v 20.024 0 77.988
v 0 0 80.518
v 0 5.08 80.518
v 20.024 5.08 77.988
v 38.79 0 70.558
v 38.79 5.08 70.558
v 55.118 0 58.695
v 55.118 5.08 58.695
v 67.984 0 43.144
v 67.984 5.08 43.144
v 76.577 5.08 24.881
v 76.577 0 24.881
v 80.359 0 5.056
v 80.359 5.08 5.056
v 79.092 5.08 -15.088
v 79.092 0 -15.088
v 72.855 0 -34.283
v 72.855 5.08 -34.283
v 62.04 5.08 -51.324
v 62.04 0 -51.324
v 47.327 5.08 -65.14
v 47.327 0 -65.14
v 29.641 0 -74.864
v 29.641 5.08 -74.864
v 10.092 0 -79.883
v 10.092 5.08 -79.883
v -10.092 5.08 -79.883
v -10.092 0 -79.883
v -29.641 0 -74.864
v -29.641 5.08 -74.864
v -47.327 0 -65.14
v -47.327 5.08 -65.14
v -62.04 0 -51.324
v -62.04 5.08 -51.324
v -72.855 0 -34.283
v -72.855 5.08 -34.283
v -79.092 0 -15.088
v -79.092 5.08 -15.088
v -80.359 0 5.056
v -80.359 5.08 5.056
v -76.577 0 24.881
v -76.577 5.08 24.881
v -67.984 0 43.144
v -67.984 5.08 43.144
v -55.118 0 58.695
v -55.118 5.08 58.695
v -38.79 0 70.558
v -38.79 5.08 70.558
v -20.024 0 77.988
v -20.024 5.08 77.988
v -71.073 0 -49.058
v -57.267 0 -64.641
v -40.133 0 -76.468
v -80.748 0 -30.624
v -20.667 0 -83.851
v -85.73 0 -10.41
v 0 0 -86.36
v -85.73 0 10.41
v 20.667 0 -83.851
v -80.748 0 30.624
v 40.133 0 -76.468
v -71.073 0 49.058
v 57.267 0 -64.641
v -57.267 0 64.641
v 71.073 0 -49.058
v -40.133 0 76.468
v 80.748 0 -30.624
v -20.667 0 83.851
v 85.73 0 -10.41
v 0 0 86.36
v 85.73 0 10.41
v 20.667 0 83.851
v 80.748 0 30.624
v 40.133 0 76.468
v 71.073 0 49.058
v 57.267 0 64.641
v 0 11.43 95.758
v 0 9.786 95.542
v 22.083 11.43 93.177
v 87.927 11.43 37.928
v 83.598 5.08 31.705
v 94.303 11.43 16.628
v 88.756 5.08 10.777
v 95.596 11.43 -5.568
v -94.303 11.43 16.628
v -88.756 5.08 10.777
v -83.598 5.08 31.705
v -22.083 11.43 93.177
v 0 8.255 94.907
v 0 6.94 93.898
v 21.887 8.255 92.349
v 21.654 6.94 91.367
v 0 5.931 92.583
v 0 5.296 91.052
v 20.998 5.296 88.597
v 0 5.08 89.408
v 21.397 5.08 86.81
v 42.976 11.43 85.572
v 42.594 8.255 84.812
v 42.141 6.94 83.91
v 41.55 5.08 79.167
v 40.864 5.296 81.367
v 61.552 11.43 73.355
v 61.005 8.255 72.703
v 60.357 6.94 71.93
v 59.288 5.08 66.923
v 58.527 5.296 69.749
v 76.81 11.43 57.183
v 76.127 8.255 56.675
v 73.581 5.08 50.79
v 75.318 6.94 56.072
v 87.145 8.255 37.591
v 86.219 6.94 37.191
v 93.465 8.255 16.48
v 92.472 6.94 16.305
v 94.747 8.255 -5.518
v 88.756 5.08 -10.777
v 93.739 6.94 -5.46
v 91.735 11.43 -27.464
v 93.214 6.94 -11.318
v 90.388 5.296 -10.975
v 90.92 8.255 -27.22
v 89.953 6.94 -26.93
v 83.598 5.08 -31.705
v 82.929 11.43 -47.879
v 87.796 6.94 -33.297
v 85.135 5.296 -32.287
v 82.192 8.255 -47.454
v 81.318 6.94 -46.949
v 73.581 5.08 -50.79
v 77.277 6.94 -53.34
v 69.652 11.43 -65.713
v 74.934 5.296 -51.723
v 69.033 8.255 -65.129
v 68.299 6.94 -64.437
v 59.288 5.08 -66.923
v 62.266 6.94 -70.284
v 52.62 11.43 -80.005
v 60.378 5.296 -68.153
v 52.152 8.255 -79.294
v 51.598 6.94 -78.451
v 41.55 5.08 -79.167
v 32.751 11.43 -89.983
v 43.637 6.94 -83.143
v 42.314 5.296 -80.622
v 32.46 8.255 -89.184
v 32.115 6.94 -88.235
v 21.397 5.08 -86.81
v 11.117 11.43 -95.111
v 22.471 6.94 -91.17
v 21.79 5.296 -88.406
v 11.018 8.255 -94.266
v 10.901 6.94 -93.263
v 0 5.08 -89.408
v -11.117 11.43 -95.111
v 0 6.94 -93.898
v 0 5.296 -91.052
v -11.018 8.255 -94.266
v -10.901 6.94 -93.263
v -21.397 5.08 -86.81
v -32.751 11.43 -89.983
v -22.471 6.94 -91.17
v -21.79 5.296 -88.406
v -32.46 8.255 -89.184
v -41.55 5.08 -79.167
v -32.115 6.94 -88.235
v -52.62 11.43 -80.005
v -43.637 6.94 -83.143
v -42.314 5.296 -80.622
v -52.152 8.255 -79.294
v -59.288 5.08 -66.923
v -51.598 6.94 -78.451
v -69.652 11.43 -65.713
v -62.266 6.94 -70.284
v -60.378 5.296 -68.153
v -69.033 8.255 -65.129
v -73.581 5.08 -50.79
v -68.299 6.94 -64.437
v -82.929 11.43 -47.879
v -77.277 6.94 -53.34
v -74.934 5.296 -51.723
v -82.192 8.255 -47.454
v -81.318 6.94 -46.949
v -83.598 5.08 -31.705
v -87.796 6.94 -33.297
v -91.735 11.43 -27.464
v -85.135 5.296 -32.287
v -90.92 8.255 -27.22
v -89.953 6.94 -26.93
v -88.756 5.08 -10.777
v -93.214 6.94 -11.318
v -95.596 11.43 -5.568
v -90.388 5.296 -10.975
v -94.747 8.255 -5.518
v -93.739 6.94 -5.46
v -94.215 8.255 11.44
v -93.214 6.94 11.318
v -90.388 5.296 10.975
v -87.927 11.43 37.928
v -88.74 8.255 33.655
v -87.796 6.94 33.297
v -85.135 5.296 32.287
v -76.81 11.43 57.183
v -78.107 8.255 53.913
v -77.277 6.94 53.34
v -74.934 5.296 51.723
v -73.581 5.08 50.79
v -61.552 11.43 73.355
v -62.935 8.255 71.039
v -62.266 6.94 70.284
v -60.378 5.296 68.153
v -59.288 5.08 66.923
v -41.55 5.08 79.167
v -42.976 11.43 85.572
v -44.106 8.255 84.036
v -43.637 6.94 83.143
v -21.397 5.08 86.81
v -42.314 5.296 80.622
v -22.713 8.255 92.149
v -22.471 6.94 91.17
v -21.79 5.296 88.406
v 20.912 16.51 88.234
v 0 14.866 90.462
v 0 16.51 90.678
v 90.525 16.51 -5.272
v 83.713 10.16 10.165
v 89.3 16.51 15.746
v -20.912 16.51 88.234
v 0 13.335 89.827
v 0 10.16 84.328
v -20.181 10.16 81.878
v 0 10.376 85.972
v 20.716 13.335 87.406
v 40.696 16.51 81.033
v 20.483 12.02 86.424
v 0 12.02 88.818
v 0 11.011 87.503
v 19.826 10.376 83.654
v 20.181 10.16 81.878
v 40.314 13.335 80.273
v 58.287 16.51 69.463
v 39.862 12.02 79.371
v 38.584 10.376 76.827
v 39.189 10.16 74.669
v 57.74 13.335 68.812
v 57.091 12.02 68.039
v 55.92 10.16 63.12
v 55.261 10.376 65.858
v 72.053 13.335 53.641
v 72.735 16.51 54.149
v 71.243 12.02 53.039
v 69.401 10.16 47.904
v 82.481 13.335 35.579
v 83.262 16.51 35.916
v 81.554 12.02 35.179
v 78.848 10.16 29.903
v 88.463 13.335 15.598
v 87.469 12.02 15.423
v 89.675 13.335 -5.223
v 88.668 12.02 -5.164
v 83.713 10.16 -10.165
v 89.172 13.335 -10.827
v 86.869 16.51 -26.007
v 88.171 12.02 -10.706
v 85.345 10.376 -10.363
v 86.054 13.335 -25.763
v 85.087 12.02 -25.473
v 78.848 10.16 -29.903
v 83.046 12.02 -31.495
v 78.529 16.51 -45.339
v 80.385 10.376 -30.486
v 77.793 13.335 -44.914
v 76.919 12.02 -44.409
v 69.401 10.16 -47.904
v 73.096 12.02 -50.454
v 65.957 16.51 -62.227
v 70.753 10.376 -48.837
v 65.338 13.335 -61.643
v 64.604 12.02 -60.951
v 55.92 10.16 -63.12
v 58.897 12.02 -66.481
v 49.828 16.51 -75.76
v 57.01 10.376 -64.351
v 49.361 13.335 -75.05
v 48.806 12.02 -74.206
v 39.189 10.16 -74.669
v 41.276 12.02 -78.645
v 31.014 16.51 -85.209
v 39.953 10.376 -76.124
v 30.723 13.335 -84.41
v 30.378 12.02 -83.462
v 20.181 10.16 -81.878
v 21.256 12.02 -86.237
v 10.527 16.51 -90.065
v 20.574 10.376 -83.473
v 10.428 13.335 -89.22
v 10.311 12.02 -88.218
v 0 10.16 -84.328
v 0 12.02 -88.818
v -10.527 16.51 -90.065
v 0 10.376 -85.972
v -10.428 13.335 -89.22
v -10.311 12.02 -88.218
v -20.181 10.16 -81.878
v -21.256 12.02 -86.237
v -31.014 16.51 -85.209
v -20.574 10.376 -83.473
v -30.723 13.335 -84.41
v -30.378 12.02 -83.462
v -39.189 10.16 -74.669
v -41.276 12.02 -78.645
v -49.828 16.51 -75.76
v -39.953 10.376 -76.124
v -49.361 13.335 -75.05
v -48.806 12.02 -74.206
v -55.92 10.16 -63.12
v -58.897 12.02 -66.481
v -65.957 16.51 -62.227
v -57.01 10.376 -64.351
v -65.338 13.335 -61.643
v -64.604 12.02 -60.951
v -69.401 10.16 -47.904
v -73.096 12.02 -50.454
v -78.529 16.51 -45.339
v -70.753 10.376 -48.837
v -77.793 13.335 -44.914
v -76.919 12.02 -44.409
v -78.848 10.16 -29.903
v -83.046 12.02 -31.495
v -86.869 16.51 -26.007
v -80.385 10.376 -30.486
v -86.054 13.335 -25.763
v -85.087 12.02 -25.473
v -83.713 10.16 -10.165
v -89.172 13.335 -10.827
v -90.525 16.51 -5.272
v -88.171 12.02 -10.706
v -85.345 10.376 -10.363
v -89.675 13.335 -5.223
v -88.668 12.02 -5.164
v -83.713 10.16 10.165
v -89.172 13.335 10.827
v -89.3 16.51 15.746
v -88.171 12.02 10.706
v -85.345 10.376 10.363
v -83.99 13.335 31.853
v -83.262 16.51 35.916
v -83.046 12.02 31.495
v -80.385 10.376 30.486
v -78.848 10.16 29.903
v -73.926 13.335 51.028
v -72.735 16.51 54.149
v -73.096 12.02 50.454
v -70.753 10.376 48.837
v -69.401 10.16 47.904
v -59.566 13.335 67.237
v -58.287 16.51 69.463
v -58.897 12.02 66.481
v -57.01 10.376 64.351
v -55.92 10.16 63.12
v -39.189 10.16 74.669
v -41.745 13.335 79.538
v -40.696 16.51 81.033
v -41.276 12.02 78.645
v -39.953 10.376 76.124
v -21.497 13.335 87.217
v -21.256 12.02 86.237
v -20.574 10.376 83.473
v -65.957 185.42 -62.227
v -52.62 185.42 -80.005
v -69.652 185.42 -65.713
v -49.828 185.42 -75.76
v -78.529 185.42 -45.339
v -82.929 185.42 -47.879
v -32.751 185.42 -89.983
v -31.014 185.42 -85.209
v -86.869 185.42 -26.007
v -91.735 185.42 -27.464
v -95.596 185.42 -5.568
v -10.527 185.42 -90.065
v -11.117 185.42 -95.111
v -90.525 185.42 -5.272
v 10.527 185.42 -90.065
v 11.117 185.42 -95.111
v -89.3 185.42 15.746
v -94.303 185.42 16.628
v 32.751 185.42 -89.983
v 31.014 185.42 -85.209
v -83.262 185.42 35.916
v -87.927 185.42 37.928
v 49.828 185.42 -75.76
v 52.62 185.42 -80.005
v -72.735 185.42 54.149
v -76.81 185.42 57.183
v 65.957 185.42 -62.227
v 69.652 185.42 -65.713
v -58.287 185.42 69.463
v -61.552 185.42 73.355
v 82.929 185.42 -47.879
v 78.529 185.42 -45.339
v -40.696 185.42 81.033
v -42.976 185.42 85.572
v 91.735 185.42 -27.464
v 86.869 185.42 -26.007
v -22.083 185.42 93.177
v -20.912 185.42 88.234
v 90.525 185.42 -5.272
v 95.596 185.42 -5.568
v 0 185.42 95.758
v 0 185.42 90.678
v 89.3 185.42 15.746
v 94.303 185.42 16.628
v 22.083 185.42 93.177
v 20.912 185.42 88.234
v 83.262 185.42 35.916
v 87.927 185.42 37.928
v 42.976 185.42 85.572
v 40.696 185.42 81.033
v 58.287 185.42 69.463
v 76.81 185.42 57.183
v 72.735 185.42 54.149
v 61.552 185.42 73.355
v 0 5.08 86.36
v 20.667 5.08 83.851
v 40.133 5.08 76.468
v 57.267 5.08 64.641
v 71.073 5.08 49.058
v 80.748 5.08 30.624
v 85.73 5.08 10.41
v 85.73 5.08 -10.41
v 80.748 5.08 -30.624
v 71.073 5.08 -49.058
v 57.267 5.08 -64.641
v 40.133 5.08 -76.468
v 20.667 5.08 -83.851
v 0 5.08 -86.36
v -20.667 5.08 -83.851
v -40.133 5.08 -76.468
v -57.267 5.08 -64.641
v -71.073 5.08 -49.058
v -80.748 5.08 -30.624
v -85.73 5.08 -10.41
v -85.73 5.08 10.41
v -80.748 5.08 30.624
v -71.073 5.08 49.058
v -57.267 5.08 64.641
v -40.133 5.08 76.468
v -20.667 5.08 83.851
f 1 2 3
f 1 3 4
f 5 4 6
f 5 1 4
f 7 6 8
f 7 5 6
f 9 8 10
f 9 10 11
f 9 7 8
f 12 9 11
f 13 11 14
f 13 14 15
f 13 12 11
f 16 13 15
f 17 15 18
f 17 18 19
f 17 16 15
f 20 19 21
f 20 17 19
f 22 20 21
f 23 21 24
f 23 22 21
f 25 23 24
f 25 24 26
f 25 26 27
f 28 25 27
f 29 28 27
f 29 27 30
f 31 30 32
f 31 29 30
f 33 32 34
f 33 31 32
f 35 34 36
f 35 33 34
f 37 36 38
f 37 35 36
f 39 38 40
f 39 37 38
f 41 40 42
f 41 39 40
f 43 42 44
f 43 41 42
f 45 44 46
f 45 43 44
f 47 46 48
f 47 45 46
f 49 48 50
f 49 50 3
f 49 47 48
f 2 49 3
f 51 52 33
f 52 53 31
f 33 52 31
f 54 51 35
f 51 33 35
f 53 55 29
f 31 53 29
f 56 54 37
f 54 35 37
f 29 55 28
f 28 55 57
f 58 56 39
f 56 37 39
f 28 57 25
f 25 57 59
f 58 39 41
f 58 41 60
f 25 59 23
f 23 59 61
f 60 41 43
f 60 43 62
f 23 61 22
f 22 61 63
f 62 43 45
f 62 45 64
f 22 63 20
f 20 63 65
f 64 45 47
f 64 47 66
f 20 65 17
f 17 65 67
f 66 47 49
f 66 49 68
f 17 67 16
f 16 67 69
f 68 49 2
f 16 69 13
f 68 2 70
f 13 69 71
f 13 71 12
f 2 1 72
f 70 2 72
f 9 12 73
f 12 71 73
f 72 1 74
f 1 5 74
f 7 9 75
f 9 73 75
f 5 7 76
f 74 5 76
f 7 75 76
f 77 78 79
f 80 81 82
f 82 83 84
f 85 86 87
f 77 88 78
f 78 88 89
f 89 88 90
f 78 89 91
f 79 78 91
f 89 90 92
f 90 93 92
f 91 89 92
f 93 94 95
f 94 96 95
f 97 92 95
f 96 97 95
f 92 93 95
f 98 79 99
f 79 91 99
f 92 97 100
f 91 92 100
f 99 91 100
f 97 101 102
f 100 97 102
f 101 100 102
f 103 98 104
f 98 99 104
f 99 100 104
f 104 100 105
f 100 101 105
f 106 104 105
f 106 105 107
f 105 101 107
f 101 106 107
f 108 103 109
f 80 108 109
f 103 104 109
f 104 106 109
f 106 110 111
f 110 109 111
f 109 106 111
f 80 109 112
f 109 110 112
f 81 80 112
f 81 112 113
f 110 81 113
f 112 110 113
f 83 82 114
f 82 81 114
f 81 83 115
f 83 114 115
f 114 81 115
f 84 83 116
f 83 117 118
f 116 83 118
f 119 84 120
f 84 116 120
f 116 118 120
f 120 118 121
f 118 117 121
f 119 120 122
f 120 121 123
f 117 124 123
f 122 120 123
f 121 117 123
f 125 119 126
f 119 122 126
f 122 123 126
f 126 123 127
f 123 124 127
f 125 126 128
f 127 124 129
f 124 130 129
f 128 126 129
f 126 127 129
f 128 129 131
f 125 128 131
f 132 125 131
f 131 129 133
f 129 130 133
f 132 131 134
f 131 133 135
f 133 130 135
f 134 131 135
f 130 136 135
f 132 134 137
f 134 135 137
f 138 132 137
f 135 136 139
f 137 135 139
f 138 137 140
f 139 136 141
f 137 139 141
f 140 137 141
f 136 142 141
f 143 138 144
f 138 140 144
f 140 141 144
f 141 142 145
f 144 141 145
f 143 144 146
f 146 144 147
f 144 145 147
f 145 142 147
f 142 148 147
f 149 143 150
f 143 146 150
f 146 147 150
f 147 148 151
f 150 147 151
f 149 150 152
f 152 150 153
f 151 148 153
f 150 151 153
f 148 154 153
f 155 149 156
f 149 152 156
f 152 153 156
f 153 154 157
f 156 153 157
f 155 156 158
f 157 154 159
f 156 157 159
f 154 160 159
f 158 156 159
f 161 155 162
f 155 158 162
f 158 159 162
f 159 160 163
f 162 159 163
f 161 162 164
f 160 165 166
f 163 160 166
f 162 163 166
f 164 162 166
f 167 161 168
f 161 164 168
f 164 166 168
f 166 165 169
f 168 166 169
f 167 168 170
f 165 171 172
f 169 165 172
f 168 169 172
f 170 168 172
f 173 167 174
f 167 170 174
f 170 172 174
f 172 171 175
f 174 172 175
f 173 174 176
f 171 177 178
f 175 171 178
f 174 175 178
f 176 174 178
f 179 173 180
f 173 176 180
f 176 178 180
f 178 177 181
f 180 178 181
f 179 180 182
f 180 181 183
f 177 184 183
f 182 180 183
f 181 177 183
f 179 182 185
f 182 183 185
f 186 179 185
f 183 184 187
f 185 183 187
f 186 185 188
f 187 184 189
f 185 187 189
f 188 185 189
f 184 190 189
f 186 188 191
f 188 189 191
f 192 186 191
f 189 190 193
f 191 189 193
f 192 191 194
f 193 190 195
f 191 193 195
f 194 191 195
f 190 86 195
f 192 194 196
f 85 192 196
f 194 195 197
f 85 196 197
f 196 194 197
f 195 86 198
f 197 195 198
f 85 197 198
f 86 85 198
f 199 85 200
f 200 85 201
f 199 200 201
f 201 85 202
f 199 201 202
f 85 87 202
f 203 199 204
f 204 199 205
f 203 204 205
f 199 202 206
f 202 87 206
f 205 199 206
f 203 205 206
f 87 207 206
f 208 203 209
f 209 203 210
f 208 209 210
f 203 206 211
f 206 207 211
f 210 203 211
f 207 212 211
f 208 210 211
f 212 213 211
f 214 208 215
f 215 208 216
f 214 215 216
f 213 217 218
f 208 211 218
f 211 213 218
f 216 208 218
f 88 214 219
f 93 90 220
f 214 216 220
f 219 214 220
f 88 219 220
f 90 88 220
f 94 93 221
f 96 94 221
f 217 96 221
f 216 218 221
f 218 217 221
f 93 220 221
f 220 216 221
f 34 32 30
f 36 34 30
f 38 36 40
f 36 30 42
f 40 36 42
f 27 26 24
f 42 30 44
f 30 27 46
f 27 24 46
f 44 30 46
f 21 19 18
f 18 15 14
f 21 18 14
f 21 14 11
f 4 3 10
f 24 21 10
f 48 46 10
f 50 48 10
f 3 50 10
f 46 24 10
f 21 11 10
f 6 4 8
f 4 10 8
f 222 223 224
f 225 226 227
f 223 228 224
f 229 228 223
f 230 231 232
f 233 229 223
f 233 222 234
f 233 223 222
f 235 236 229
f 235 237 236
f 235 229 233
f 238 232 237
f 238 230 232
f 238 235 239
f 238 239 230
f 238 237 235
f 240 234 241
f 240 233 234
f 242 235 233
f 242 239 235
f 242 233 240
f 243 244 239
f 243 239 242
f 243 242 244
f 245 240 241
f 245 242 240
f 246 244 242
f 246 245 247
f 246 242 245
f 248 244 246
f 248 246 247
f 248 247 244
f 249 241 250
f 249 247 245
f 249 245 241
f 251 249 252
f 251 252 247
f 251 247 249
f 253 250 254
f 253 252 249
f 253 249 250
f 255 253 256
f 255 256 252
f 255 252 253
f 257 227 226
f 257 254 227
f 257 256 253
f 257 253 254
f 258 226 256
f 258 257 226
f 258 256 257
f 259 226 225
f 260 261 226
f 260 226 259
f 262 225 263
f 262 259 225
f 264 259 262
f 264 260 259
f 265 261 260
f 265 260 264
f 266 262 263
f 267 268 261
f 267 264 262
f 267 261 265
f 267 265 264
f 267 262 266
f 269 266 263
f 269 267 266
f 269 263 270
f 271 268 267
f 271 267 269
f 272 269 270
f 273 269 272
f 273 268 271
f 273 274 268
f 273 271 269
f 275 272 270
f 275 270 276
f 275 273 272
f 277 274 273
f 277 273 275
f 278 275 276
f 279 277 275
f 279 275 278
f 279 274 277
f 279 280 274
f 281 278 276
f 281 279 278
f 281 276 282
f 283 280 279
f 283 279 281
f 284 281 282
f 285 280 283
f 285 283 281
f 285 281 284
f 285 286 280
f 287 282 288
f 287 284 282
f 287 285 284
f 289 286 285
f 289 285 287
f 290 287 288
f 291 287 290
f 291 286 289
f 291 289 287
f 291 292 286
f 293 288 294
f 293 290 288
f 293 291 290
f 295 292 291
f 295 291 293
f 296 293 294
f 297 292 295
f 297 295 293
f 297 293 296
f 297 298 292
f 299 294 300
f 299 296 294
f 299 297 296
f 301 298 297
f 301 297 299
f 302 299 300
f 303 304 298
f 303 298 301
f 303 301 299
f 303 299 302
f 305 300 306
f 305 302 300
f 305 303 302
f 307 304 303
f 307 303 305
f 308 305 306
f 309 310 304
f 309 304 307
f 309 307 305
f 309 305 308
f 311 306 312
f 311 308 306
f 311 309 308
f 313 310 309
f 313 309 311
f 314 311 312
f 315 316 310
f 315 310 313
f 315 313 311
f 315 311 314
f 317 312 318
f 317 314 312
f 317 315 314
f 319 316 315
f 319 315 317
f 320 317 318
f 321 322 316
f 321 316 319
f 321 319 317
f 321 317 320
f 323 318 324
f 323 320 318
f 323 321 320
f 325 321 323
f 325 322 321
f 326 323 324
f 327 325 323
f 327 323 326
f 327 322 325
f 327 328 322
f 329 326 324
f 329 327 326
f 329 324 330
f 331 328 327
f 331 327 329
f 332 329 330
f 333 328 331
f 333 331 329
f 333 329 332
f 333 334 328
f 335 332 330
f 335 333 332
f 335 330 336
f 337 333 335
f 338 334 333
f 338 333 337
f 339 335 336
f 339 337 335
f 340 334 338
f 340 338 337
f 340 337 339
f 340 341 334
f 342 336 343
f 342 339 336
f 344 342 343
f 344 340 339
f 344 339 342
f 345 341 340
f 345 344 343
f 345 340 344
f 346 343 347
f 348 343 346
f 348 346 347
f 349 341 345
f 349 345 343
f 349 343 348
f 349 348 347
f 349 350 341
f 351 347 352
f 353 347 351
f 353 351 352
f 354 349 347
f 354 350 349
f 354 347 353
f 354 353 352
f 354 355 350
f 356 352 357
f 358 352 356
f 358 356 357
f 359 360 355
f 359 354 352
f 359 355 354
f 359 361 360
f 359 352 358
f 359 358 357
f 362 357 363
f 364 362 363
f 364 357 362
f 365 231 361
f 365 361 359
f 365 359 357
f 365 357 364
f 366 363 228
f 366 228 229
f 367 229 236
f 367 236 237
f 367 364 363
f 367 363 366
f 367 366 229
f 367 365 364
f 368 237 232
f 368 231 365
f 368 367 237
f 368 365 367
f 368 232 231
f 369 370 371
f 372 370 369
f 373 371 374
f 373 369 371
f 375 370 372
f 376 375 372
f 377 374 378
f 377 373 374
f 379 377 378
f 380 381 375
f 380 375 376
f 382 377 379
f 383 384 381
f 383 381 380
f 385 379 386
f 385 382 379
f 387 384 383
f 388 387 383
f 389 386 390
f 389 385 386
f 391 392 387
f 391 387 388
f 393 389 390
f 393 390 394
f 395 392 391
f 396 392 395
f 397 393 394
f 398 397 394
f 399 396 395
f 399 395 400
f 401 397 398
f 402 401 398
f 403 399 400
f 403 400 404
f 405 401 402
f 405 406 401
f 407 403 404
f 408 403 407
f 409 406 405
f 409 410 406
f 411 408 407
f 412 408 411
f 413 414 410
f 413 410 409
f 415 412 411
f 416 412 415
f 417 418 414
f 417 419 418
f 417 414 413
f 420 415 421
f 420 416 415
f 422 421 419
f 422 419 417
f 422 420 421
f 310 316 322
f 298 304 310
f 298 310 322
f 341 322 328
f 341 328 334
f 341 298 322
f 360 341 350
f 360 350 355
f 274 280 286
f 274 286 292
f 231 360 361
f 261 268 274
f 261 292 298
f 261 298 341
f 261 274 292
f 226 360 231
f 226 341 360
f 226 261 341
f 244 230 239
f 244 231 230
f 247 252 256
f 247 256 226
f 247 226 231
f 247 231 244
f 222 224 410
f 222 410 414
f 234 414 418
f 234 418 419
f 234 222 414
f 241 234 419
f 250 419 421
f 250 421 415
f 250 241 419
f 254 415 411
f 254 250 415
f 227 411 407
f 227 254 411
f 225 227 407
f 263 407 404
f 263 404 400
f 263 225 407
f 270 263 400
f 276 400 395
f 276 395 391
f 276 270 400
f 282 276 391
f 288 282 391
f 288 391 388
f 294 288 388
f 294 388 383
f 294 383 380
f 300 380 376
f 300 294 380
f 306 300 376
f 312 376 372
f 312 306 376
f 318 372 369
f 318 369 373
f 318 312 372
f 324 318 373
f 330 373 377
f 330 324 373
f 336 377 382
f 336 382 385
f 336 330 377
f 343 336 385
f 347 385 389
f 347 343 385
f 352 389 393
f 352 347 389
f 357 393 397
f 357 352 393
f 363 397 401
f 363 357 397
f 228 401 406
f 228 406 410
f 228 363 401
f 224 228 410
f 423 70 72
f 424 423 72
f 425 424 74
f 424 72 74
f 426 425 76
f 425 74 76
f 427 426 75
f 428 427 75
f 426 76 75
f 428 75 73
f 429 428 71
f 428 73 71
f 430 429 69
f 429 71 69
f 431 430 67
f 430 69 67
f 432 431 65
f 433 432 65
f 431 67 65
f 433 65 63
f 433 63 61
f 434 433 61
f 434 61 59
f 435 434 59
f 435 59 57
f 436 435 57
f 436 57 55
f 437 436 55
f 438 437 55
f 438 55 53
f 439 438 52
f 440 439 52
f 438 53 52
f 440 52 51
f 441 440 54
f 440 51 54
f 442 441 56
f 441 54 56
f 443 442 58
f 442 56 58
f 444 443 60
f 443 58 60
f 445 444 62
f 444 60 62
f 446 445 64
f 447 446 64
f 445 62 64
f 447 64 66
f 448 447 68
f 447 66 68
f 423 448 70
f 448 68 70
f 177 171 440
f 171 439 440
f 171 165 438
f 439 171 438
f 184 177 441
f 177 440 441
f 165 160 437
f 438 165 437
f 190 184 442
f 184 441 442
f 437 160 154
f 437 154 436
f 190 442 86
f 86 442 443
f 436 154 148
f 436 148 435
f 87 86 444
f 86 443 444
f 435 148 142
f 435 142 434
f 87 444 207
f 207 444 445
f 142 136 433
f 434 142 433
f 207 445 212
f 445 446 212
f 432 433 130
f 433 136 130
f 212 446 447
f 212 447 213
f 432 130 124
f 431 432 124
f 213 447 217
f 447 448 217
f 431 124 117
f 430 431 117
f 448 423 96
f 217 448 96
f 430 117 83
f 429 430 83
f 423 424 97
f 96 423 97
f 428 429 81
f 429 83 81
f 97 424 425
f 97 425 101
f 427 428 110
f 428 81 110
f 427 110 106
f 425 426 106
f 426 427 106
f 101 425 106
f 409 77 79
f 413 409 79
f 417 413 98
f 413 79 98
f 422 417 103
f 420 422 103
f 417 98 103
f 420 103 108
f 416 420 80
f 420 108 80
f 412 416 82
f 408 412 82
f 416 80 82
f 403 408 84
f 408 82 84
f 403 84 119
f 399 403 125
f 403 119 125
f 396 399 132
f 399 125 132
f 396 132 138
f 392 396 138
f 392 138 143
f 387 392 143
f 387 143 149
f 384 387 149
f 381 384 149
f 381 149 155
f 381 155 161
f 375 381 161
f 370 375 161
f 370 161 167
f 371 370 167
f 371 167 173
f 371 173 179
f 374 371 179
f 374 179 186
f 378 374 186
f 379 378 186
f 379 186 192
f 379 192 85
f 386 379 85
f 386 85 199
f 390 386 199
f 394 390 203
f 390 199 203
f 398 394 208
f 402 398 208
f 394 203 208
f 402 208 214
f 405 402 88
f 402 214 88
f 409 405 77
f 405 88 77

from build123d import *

# Parameters (mm, degrees)
SKETCH1_R           = 86.36
SKETCH1_R_2         = 80.518
BOSS_EXTRUDE1_DEPTH = 5.08
SKETCH2_R           = 95.758
BOSS_EXTRUDE2_DEPTH = 5.08
SKETCH3_R           = 95.758
SKETCH3_R_2         = 90.678
BOSS_EXTRUDE3_DEPTH = 175.26
FILLET1_R           = 6.35


with BuildPart() as part:
    # Sketch1 → Boss-Extrude1 (new body)
    with BuildSketch(Plane(origin=(0, 0, 0), x_dir=(1, 0, 0), z_dir=(0, 1, 0))):
        with Locations(Location((0, 0, 0), (0, 0, 270))):
            Circle(SKETCH1_R)
        with Locations(Location((0, 0, 0), (0, 0, 270))):
            Circle(SKETCH1_R_2, mode=Mode.SUBTRACT)
    extrude(amount=BOSS_EXTRUDE1_DEPTH)

    # Sketch2 → Boss-Extrude2 (add)
    with BuildSketch(Plane(origin=(0, 5.08, 0), x_dir=(1, 0, 0), z_dir=(0, 1, 0))):
        with Locations(Location((0, 0, 0), (0, 0, 270))):
            Circle(SKETCH2_R)
    extrude(amount=BOSS_EXTRUDE2_DEPTH)

    # Sketch3 → Boss-Extrude3 (add)
    with BuildSketch(Plane(origin=(0, 10.16, 0), x_dir=(1, 0, 0), z_dir=(0, 1, 0))):
        with Locations(Location((0, 0, 0), (0, 0, 270))):
            Circle(SKETCH3_R)
        with Locations(Location((0, 0, 0), (0, 0, 270))):
            Circle(SKETCH3_R_2, mode=Mode.SUBTRACT)
    extrude(amount=BOSS_EXTRUDE3_DEPTH)

    # Fillet1
    fillet1_edges = [part.edges().sort_by_distance(p)[0] for p in [
        (0, 10.16, -90.678),
        (0, 5.08, -95.758),
    ]]
    fillet(fillet1_edges, radius=FILLET1_R)


solid = part.part
